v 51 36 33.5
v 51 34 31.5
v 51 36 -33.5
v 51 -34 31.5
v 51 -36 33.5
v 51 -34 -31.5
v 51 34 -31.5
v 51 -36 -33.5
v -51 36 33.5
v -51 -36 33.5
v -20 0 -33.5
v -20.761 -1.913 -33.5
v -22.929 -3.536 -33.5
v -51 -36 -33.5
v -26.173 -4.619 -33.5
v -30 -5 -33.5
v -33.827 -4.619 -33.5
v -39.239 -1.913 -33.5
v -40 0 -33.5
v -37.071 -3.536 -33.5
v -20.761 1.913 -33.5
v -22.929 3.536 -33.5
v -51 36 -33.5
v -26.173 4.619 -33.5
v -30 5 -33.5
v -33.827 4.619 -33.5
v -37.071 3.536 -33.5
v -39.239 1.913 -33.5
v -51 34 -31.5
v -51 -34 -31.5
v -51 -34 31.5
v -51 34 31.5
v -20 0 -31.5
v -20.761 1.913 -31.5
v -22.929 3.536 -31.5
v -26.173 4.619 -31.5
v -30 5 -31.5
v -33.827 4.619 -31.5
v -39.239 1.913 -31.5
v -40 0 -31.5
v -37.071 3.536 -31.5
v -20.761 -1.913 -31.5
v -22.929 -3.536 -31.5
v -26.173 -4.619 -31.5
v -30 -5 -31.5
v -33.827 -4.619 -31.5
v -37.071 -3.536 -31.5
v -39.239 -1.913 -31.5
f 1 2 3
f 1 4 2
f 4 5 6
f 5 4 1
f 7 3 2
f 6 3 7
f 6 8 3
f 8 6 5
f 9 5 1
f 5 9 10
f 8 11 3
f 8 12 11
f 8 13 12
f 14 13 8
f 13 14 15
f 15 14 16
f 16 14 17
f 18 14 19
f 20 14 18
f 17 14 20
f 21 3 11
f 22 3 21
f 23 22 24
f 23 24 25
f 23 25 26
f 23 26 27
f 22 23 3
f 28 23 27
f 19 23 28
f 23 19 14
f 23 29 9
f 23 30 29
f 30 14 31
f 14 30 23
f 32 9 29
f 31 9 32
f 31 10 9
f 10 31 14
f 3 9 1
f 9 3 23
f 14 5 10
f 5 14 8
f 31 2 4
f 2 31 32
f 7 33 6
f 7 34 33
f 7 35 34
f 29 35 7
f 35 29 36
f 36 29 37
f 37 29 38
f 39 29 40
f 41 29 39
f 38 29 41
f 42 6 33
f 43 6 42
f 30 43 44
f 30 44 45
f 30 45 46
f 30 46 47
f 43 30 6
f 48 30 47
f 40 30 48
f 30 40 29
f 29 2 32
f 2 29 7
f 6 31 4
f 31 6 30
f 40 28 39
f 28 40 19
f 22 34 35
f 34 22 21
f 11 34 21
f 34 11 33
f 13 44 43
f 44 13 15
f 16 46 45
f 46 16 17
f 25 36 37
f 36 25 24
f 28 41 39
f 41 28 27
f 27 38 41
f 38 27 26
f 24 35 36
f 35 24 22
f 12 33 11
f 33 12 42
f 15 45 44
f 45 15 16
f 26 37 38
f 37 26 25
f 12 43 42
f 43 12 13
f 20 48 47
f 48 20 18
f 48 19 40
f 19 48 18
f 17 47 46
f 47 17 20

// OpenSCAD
/* outer hull op 3 way electrical outlet*/

module outer_hull() {
	difference(){
		cube([102,72,67],center=true);
		cube([103,68,63],center=true);
		translate([-30,0,-34])scale([2,1,1])cylinder(4,5,5);
	}
}

outer_hull();
